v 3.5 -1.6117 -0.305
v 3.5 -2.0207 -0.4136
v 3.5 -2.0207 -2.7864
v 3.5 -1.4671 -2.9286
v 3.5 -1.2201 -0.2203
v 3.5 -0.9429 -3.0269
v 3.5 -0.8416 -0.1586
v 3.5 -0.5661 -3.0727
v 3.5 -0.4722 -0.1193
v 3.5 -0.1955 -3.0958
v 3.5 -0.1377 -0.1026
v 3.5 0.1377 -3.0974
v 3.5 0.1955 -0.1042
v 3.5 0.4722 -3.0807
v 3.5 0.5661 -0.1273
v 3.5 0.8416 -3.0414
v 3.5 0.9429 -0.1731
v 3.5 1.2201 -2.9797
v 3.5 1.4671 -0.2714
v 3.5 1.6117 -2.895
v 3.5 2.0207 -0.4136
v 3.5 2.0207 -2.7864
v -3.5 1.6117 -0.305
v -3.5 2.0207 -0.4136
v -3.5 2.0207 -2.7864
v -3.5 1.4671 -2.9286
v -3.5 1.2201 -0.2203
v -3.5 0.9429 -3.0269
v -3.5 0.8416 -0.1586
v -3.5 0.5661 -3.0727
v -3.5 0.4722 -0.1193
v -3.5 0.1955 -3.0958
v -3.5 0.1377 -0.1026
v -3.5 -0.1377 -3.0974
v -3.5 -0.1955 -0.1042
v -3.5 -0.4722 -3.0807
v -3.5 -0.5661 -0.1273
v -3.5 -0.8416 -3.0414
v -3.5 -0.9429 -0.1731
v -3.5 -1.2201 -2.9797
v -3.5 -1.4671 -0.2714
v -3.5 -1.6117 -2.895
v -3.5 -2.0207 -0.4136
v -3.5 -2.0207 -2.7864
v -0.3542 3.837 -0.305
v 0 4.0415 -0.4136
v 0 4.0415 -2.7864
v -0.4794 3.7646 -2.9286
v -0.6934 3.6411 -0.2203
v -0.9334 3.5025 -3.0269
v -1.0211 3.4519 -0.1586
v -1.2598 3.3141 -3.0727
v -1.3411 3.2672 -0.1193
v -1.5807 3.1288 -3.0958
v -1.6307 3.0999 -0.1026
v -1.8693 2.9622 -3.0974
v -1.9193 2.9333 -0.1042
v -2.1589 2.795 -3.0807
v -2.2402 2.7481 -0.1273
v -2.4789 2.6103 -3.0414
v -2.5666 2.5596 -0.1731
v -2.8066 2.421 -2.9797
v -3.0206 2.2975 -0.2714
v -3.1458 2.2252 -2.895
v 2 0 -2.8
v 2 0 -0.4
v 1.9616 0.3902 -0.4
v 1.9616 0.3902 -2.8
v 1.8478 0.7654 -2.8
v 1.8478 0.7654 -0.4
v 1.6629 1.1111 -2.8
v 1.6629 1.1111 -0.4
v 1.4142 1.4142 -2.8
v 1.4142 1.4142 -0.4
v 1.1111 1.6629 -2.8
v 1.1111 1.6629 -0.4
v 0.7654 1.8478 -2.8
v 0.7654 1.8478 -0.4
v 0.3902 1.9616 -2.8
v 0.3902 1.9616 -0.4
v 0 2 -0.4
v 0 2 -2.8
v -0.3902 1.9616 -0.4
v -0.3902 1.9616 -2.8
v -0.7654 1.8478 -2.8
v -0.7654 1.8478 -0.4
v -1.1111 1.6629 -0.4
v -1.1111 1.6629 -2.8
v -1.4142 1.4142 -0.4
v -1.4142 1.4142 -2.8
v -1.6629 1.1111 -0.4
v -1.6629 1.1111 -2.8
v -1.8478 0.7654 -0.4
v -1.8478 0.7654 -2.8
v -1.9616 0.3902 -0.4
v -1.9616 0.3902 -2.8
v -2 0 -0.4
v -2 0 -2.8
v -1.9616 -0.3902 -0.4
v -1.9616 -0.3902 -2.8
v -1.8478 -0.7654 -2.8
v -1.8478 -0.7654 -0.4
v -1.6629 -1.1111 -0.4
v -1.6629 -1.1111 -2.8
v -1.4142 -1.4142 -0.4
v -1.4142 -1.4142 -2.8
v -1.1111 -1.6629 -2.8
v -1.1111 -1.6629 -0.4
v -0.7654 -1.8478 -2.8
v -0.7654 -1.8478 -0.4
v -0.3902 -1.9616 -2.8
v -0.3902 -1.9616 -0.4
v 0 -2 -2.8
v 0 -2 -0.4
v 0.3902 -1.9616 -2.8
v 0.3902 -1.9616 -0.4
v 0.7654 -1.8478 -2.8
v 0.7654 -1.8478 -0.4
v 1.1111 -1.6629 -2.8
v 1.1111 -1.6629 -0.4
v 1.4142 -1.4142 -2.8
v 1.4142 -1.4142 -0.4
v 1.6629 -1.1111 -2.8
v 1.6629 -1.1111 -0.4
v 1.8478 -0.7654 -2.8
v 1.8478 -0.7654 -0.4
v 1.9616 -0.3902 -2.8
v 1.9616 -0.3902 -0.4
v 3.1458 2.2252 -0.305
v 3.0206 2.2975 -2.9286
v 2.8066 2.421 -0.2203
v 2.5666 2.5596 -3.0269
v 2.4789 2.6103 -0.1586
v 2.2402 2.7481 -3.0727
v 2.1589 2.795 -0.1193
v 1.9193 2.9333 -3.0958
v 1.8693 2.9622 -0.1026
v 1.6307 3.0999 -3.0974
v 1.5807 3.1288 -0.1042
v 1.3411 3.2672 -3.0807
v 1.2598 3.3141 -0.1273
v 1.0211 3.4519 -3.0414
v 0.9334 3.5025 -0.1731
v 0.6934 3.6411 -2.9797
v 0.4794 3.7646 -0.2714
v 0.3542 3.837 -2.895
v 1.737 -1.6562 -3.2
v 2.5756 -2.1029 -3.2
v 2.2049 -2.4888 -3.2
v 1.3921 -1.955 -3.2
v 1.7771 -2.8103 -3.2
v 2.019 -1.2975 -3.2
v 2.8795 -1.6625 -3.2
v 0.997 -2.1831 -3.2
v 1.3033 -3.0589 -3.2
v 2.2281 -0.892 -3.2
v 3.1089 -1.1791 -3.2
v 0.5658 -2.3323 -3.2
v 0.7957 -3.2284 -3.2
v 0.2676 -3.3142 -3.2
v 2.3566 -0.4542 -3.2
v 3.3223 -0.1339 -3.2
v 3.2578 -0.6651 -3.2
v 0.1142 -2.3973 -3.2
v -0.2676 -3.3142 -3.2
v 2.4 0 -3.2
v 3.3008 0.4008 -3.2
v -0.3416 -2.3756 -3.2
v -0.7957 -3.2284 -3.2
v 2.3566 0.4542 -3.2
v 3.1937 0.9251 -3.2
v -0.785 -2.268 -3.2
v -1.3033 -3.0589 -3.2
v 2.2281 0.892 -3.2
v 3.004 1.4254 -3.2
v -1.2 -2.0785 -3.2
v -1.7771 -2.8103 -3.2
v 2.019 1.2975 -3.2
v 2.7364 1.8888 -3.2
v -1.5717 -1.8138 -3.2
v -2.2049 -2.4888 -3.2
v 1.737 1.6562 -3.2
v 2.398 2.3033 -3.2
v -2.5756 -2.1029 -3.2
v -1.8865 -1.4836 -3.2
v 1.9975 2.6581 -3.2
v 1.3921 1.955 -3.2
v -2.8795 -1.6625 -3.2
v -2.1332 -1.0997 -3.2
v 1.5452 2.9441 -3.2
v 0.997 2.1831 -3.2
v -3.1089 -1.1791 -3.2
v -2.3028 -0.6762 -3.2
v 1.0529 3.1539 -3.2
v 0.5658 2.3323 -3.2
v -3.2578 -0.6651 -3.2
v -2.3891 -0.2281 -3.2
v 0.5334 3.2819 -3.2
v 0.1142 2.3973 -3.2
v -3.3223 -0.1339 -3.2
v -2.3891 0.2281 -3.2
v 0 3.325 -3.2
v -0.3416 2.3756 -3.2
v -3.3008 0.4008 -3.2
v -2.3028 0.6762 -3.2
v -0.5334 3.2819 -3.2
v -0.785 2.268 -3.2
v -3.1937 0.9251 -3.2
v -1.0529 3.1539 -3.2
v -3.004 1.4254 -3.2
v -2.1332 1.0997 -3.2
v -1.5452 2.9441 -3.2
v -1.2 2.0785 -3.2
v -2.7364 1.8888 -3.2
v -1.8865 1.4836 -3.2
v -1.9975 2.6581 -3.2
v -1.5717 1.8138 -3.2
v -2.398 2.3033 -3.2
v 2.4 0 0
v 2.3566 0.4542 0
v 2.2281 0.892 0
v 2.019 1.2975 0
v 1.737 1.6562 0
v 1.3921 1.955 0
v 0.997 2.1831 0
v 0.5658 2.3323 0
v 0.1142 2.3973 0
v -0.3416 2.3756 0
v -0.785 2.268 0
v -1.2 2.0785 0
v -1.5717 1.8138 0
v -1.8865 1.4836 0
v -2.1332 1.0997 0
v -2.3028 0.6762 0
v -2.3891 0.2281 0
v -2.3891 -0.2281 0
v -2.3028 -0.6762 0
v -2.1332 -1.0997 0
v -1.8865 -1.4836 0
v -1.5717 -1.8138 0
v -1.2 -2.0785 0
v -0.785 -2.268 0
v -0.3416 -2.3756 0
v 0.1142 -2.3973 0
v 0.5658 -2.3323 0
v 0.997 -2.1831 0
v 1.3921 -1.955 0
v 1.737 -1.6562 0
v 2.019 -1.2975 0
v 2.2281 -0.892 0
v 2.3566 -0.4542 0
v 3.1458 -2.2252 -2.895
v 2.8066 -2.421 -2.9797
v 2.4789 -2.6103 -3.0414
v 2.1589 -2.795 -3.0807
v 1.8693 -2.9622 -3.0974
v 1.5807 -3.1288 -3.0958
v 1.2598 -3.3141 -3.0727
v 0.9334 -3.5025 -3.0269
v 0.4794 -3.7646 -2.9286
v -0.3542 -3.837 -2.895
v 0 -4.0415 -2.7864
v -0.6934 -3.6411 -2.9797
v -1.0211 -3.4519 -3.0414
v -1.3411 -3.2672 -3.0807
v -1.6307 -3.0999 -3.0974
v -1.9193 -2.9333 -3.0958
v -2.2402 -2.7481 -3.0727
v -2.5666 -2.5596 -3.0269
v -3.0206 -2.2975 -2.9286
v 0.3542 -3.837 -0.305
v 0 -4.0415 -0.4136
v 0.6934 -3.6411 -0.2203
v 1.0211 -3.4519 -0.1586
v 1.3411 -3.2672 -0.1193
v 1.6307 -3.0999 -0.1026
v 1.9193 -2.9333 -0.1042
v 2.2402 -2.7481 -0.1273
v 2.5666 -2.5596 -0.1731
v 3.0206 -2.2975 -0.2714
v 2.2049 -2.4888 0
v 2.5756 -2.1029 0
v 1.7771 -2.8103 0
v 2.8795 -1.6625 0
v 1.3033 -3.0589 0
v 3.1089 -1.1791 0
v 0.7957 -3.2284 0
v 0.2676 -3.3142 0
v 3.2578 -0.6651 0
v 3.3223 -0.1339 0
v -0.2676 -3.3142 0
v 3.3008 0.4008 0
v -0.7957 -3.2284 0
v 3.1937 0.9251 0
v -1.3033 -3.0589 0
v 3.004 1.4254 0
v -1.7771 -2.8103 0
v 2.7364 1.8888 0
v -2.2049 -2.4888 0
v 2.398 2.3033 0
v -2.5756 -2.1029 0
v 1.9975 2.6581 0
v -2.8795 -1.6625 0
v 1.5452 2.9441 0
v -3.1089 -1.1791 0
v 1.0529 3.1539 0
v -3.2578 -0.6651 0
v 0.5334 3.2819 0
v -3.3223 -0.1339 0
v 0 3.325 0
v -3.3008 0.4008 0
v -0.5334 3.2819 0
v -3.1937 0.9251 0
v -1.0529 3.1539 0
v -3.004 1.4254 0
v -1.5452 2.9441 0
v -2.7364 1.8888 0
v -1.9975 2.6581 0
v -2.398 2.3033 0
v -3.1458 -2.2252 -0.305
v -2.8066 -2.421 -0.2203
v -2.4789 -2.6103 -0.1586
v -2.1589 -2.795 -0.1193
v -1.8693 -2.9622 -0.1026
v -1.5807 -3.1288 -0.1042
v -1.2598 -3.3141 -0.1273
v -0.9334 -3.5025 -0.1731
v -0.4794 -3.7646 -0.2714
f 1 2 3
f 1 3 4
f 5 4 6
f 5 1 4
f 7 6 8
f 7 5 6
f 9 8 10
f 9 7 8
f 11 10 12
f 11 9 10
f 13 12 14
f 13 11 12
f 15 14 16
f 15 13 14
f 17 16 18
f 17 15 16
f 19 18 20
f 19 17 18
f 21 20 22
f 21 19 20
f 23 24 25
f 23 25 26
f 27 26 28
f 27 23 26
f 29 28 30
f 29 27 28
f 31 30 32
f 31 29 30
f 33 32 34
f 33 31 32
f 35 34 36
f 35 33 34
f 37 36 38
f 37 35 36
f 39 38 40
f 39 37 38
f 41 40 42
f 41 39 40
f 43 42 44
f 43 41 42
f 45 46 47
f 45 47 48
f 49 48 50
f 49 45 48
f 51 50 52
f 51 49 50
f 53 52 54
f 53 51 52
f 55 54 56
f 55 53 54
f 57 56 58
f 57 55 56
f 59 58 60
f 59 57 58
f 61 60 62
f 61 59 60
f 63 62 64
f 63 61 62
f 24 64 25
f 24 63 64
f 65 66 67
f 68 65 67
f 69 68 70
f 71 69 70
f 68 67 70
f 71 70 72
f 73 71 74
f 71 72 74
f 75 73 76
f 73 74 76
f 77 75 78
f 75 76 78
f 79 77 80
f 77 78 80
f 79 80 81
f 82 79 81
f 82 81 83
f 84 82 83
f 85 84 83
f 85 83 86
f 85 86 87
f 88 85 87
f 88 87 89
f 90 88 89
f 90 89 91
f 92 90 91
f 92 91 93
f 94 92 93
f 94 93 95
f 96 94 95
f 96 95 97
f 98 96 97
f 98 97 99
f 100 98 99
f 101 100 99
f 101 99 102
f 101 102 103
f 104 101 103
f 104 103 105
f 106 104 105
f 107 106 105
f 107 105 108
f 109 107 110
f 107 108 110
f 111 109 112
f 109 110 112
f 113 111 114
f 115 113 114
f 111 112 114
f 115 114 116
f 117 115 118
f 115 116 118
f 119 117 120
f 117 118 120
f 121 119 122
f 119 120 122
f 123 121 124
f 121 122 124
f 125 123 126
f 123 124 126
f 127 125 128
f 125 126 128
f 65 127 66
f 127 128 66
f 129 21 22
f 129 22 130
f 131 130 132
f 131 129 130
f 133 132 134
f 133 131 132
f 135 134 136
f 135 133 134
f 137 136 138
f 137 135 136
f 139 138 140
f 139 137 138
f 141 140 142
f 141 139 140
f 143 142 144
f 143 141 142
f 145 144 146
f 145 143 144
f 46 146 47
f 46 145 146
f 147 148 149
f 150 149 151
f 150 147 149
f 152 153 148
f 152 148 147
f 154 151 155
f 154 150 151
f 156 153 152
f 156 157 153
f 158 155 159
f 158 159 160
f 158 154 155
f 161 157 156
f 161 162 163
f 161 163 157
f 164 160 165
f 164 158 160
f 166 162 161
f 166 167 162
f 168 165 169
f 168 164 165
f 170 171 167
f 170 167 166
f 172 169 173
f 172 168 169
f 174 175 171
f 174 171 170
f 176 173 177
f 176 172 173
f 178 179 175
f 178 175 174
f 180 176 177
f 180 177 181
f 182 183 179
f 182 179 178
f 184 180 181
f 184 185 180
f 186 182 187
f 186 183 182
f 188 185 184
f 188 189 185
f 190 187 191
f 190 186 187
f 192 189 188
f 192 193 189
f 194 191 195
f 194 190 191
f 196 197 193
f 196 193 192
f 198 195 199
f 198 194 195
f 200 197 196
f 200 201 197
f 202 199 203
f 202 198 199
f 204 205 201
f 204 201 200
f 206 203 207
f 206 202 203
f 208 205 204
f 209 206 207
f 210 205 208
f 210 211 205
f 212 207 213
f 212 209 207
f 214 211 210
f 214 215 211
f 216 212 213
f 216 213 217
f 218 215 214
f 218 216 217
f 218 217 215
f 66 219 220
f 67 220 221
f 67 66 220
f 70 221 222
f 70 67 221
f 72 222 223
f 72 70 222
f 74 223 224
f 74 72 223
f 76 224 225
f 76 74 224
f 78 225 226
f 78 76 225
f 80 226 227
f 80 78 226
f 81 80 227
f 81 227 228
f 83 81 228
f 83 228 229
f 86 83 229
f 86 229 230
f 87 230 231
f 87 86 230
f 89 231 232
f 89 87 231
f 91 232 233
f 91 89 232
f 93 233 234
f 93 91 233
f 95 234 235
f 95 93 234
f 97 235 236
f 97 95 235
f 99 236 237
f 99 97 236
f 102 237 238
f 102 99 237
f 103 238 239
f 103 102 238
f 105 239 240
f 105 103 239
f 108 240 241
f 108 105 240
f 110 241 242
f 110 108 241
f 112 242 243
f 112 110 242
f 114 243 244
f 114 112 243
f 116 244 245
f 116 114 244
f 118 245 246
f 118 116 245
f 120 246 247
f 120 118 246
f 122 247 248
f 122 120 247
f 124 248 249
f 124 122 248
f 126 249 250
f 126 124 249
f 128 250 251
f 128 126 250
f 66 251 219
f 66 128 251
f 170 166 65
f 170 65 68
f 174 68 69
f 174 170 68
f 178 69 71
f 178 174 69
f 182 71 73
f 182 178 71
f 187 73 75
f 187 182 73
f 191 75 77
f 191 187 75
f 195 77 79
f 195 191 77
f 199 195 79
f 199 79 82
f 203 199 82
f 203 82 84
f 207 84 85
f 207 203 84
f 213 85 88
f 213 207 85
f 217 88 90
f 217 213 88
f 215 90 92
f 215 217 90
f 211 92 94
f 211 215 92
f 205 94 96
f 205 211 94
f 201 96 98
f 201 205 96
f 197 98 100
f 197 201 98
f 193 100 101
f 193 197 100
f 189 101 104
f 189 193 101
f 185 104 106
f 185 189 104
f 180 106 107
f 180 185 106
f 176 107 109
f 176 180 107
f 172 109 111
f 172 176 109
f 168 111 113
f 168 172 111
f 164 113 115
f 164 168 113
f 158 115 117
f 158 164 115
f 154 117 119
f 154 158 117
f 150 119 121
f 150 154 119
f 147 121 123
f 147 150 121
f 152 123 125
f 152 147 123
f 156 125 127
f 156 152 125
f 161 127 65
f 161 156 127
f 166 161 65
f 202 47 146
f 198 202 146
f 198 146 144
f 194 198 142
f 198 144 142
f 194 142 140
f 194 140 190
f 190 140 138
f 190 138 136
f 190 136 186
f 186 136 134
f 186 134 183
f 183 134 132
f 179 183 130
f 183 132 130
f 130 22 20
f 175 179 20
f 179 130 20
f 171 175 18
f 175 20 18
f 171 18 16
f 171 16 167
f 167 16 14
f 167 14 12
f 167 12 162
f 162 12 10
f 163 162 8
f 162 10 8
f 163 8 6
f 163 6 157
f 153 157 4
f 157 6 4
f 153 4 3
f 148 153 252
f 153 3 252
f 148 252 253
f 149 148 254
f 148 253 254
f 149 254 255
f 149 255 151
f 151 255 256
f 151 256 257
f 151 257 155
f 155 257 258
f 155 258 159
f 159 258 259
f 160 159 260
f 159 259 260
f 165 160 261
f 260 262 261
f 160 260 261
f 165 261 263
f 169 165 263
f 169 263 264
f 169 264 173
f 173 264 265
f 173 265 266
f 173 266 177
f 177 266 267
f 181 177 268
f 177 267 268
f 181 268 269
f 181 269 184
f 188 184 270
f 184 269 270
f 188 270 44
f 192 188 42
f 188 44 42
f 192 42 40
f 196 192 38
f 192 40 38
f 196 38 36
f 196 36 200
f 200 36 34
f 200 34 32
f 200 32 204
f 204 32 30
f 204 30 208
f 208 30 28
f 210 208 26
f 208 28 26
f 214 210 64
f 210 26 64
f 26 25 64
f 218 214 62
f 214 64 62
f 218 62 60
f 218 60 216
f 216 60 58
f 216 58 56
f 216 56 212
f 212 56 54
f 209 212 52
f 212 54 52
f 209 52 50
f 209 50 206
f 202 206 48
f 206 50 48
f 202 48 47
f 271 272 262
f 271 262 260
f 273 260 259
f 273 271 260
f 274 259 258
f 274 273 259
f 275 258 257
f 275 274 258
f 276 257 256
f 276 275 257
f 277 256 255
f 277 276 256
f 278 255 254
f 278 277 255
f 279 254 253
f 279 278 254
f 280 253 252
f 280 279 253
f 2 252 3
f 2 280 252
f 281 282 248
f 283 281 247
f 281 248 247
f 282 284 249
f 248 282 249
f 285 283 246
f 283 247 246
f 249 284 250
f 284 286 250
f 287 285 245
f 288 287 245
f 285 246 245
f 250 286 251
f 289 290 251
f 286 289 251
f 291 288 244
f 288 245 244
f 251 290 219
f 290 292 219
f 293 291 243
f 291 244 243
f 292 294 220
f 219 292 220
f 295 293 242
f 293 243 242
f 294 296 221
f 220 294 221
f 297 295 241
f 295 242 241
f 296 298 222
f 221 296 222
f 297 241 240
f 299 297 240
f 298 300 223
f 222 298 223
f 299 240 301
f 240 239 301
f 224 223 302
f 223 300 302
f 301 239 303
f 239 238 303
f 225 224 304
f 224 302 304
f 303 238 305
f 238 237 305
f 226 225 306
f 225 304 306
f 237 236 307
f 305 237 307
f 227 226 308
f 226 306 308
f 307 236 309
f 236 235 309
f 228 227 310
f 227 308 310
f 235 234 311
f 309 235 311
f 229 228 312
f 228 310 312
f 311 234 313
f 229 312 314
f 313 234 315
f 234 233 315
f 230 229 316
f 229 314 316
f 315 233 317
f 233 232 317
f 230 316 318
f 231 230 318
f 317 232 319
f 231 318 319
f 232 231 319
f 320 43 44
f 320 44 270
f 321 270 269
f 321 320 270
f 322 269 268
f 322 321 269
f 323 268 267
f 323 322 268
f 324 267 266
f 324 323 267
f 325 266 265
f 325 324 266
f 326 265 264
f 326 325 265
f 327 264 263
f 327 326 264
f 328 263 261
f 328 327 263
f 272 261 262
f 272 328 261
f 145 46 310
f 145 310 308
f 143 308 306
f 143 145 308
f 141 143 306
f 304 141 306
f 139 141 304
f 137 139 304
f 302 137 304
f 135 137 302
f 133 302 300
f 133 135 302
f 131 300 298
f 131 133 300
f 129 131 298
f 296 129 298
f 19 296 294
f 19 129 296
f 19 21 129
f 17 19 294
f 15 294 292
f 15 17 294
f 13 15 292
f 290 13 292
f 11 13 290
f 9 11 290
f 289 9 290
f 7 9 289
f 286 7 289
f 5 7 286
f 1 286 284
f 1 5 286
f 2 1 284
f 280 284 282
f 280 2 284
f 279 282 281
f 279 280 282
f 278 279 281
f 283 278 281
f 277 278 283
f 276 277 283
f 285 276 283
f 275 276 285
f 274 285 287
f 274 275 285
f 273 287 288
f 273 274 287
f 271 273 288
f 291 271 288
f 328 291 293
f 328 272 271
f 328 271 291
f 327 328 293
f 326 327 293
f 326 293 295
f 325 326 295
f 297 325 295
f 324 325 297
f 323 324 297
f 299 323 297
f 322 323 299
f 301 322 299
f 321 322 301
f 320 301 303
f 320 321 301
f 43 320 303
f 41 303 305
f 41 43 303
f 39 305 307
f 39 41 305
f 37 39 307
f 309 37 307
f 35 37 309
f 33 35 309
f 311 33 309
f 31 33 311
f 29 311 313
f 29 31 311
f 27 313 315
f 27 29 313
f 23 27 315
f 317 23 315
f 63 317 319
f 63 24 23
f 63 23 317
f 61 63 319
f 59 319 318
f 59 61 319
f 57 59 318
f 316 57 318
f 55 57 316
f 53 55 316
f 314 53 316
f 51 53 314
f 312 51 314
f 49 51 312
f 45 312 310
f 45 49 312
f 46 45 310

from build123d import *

# Parameters (mm, degrees)
SKETCH_1_W               = 5
SKETCH_1_H               = 3.2
SKETCH_2_OUTSIDE_W       = 14.9
SKETCH_2_OUTSIDE_H       = 14.9
CUT_EXTRUDE_1_DEPTH      = 3.2
SKETCH_3_R               = 2
CUT_EXTRUDE_2_DEPTH      = 1
CUT_EXTRUDE_2_DEPTH_BACK = 4.2
CHAMFER_1_SIZE           = 0.4


with BuildPart() as part:
    # Эскиз1 → Повернуть1 (revolve)
    with BuildSketch(Plane(origin=(0, 0, 0), x_dir=(1, 0, 0), z_dir=(0, 1, 0))):
        with Locations((-2.5, 1.6)):
            Rectangle(SKETCH_1_W, SKETCH_1_H)
    revolve(axis=Axis((0, 0, 0), (0, 0, -1)))

    # Эскиз2 outside → Вырез-Вытянуть1 (cut)
    with BuildSketch(Plane.XY):
        Rectangle(SKETCH_2_OUTSIDE_W, SKETCH_2_OUTSIDE_H)
        Polygon((3.5, -2.020725942), (3.5, 2.020725942), (0, 4.041451884), (-3.5, 2.020725942), (-3.5, -2.020725942), (0, -4.041451884), align=None, mode=Mode.SUBTRACT)
    extrude(amount=-CUT_EXTRUDE_1_DEPTH, mode=Mode.SUBTRACT)

    # Эскиз3 → Вырез-Вытянуть2 (cut, two sides)
    with BuildSketch(Plane.XY) as cut_extrude_2_sk:
        Circle(SKETCH_3_R)
    extrude(amount=CUT_EXTRUDE_2_DEPTH, mode=Mode.SUBTRACT)
    extrude(cut_extrude_2_sk.sketch, amount=-CUT_EXTRUDE_2_DEPTH_BACK, mode=Mode.SUBTRACT)

    # Эскиз4 → Вырез-Повернуть1 (revolve, cut)
    with BuildSketch(Plane(origin=(0, 0, 0), x_dir=(0, 0, -1), z_dir=(1, 0, 0))):
        Polygon((0, 3.325), (0.413643688, 4.041451884), (0, 4.041451884), align=None)
        Polygon((3.2, 3.325), (2.786356312, 4.041451884), (3.2, 4.041451884), align=None)
    revolve(axis=Axis((0, 0, 0), (0, 0, -1)), mode=Mode.SUBTRACT)

    # Фаска1
    chamfer_1_edges = [part.edges().sort_by_distance(p)[0] for p in [
        (-2, 0, -3.2),
        (-2, 0, 0),
    ]]
    chamfer(chamfer_1_edges, length=CHAMFER_1_SIZE)


solid = part.part
